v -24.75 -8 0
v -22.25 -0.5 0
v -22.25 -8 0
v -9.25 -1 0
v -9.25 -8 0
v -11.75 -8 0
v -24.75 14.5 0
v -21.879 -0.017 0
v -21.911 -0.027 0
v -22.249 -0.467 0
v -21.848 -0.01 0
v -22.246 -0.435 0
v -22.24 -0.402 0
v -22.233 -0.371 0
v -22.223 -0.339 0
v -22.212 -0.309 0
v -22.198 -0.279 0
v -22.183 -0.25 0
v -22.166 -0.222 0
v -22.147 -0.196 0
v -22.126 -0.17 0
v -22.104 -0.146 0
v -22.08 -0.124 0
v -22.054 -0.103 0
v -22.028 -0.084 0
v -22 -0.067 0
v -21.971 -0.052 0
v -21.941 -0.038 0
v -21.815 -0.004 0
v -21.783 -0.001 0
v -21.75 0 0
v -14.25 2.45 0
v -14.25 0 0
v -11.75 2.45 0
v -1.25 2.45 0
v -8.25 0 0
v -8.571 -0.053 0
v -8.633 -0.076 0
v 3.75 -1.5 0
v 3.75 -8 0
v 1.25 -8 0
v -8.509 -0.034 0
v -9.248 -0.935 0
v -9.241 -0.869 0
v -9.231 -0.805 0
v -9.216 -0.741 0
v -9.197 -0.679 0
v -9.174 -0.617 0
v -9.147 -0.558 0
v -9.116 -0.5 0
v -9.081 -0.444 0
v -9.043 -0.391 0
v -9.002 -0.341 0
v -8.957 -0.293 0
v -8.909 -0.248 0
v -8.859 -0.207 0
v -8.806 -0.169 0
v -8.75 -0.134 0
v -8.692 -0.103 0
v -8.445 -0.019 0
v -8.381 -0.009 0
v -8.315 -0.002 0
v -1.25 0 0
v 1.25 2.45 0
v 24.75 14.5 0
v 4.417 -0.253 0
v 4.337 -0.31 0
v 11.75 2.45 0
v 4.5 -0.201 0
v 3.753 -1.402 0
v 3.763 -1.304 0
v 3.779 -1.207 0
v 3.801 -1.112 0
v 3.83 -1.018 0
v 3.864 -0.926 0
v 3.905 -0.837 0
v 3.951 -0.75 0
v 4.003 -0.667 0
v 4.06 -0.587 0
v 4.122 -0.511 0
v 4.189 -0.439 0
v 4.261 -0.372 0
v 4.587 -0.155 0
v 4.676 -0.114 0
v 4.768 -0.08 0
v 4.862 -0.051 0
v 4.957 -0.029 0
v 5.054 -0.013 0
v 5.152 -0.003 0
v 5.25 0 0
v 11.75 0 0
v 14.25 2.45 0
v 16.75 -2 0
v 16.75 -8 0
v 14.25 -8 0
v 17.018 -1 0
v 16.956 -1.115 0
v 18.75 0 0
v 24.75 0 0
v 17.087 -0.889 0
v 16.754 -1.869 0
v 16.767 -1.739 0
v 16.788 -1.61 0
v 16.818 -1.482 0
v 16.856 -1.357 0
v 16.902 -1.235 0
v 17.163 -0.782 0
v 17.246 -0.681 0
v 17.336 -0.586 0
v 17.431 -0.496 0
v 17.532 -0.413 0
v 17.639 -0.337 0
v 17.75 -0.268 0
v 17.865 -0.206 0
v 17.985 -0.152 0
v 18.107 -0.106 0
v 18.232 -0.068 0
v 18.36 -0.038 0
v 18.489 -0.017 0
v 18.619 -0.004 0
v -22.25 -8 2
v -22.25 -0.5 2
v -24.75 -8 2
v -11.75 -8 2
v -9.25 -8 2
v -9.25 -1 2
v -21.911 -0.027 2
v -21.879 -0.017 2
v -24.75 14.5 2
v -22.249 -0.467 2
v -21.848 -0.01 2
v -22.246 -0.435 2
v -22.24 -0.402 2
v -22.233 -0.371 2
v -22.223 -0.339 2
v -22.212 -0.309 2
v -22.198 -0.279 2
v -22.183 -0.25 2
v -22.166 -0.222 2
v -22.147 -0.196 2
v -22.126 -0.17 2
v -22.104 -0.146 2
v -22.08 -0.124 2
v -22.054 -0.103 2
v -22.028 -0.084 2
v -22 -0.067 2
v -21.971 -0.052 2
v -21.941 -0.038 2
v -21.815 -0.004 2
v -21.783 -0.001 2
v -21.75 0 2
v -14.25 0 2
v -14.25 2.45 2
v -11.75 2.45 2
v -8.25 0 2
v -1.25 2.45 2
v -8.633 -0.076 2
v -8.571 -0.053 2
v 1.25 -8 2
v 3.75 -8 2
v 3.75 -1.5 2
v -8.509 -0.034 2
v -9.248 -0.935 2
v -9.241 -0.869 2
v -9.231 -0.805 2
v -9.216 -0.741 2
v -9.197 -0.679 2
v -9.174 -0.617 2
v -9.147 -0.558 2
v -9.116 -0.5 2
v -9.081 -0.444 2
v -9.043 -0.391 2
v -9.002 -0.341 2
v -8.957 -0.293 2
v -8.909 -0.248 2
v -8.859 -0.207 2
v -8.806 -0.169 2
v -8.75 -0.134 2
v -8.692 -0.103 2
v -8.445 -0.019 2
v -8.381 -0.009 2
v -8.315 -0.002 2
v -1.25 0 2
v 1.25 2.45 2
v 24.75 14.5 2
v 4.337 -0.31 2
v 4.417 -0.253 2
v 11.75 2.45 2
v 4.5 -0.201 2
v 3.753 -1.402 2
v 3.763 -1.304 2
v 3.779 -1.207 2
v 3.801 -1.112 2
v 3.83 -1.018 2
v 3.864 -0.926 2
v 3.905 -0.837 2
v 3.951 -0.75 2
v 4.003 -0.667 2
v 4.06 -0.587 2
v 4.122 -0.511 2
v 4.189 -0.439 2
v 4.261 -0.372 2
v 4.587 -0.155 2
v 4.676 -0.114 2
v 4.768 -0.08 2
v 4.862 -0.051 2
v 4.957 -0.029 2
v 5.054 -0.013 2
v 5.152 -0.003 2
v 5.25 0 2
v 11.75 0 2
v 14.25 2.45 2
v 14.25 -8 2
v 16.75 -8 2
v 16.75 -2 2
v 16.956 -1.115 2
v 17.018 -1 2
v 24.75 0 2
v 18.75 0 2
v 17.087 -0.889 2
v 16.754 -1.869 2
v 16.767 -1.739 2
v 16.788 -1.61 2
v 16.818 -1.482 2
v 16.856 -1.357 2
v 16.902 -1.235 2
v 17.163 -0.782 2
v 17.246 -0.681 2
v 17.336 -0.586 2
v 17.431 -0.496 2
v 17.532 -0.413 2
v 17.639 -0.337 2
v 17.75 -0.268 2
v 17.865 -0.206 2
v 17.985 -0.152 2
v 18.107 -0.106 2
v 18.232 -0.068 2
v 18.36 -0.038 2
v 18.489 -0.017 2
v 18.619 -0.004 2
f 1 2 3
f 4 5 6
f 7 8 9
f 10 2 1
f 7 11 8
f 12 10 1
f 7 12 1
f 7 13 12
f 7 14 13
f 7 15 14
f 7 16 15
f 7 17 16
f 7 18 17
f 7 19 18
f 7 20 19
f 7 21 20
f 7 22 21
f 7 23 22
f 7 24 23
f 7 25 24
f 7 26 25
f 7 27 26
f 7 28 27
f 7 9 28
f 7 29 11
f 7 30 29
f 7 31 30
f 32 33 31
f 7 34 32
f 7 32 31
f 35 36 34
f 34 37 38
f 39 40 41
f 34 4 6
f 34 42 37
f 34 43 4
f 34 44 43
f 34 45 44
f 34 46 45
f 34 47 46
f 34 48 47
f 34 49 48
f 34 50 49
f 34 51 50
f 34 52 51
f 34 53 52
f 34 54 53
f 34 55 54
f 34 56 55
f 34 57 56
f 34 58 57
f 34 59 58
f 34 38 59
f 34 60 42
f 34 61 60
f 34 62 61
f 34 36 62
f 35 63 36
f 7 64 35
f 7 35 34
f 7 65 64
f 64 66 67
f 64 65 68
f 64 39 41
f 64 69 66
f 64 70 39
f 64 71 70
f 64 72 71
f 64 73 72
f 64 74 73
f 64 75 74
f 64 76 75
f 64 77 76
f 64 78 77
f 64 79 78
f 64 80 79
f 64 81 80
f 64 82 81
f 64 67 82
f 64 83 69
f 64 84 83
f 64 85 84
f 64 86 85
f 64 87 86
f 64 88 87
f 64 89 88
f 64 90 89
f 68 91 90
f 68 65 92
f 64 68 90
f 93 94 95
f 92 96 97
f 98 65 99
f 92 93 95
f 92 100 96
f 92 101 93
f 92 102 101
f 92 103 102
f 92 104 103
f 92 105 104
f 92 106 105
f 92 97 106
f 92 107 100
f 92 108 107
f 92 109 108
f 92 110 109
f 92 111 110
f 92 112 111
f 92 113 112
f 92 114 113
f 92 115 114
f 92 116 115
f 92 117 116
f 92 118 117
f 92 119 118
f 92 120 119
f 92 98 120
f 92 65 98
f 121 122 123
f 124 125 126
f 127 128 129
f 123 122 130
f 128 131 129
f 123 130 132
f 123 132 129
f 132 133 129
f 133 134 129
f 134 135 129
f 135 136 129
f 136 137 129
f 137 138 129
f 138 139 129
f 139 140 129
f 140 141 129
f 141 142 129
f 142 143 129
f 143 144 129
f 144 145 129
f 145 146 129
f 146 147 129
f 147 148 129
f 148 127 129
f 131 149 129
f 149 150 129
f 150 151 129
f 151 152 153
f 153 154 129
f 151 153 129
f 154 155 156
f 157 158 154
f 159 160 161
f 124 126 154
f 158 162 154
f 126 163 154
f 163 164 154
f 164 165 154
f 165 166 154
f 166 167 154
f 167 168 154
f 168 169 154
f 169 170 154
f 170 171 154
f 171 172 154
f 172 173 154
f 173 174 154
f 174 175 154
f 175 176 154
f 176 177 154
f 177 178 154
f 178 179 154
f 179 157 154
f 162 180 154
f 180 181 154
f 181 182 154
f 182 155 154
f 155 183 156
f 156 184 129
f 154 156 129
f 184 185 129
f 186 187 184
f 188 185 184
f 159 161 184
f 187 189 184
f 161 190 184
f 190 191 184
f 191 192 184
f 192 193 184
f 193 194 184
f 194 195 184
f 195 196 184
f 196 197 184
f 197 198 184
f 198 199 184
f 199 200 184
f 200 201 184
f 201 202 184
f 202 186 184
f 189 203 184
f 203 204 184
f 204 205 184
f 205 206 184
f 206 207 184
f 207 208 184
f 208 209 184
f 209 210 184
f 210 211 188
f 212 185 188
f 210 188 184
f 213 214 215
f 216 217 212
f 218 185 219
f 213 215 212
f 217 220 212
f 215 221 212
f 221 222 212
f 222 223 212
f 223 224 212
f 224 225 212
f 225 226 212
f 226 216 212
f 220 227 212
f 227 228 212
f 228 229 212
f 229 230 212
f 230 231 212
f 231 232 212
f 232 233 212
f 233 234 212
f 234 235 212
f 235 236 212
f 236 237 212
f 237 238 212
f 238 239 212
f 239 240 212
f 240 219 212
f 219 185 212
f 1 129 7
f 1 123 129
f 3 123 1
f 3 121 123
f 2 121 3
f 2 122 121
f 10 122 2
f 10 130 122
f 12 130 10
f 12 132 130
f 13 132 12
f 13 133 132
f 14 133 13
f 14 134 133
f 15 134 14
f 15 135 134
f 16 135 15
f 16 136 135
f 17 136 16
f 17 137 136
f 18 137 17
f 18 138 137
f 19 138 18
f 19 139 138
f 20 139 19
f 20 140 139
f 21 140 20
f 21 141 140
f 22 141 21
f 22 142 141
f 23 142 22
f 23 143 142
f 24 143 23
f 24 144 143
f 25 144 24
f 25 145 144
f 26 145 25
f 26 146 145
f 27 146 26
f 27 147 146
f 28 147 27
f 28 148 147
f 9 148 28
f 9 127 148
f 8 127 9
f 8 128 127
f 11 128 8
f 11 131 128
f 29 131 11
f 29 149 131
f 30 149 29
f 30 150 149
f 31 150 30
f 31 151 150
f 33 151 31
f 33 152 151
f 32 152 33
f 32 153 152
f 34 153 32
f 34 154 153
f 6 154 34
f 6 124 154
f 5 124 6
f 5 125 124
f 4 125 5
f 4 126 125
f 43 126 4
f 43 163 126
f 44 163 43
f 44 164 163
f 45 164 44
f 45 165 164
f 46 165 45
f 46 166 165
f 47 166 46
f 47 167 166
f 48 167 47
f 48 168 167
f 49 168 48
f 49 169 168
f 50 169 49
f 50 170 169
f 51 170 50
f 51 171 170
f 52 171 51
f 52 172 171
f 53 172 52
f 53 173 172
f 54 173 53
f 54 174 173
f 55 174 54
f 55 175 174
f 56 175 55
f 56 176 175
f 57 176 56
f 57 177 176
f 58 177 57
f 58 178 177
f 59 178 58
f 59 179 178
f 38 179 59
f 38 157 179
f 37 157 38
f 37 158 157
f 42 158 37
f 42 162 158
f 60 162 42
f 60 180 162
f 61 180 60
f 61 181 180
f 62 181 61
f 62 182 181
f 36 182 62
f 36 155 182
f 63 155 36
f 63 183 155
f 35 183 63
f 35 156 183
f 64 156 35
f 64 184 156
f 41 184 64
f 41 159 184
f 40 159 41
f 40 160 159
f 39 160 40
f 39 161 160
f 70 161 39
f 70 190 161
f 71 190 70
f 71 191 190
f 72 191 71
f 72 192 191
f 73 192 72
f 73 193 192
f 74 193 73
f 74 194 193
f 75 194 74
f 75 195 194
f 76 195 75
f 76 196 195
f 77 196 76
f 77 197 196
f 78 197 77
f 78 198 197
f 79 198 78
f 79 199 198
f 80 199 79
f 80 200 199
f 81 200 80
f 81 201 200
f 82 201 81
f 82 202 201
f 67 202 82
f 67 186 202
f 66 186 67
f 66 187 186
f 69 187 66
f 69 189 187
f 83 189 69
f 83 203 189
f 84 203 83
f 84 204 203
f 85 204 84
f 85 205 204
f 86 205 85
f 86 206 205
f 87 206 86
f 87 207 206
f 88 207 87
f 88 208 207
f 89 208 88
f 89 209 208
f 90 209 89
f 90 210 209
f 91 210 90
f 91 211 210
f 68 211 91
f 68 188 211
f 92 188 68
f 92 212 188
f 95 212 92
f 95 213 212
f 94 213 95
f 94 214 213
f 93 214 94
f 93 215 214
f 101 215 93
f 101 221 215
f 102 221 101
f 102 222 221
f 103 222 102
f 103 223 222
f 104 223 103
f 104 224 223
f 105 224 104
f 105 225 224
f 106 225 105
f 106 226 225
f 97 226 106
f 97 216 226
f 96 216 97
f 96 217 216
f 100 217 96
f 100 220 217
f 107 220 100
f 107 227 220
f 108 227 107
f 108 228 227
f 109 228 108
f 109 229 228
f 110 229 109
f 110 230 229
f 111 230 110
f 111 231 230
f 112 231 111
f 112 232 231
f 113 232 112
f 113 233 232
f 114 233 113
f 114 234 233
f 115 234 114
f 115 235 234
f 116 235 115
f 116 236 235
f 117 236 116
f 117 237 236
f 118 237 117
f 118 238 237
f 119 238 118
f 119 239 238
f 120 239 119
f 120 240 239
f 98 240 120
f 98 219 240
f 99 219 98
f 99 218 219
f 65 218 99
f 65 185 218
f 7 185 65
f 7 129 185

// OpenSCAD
// file: ../hub75_p5_64x32_outer_corner_radius_comparator.scad
// R2: coarse external-corner radius comparator for the HUB75 rear perimeter.
//
// The production model currently uses R0 at the rear outer X/Z corner. This
// helper does not assume that is physically correct: it provides four small
// concave external-radius references so a real moulded radius can be bracketed
// before changing CAD.

function hub75_vrf_outer_corner_radius_comparator_version() = "v0.3";
function hub75_vrf_outer_corner_radius_comparator_radii() = [0.5, 1.0, 1.5, 2.0];
function hub75_vrf_outer_corner_radius_comparator_probe_leg() = 8.0;
function hub75_vrf_outer_corner_radius_comparator_probe_wall() = 2.5;
function hub75_vrf_outer_corner_radius_comparator_spacing() = 13.0;
function hub75_vrf_outer_corner_radius_comparator_handle_height() = 12.0;

function hub75_vrf_outer_corner_radius_comparator_total_width() =
    let(
        radii = hub75_vrf_outer_corner_radius_comparator_radii(),
        leg = hub75_vrf_outer_corner_radius_comparator_probe_leg(),
        wall = hub75_vrf_outer_corner_radius_comparator_probe_wall(),
        spacing = hub75_vrf_outer_corner_radius_comparator_spacing()
    )
    (len(radii)-1)*spacing + leg + wall;

function hub75_vrf_outer_corner_radius_probe_tangent(index) =
    let(
        total_w = hub75_vrf_outer_corner_radius_comparator_total_width(),
        wall = hub75_vrf_outer_corner_radius_comparator_probe_wall(),
        spacing = hub75_vrf_outer_corner_radius_comparator_spacing()
    )
    [-total_w/2 + wall + index*spacing, 0];

// Canonical external-radius probe around a convex 90-degree corner.
// The theoretical sharp tangent intersection is [0,0]. In this orientation the
// physical part being checked occupies +X/-Y, so a rounded corner of radius r
// has its arc centre at [+r,-r]. The gauge material sits outside that corner on
// the top/left side. This orientation keeps the raised labels readable when the
// helper is used on the rear upper-left panel corner.
function _hub75_vrf_outer_radius_probe_points(radius, leg, wall, steps=24) =
    concat(
        [[leg, 0], [radius, 0]],
        [
            for(i=[1:steps-1])
                let(a = 90 - i*90/steps)
                [
                    radius - radius*cos(a),
                    -radius + radius*sin(a)
                ]
        ],
        [
            [0, -radius],
            [0, -leg],
            [-wall, -leg],
            [-wall, wall],
            [leg, wall]
        ]
    );

module _hub75_vrf_outer_radius_probe_2d(
    radius,
    leg = hub75_vrf_outer_corner_radius_comparator_probe_leg(),
    wall = hub75_vrf_outer_corner_radius_comparator_probe_wall()
) {
    polygon(points=_hub75_vrf_outer_radius_probe_points(radius, leg, wall));
}

module hub75_vrf_outer_corner_radius_comparator_base(
    thickness = 2.0,
    leg = hub75_vrf_outer_corner_radius_comparator_probe_leg(),
    wall = hub75_vrf_outer_corner_radius_comparator_probe_wall(),
    spacing = hub75_vrf_outer_corner_radius_comparator_spacing(),
    handle_height = hub75_vrf_outer_corner_radius_comparator_handle_height()
) {
    radii = hub75_vrf_outer_corner_radius_comparator_radii();
    total_w = (len(radii)-1)*spacing + leg + wall;

    linear_extrude(height=thickness)
        union() {
            // Slight overlap avoids relying on a merely coplanar contact between
            // the individual probe arms and the common handle.
            translate([-total_w/2, wall-0.05])
                square([total_w, handle_height+0.05]);

            for(i=[0:len(radii)-1]) {
                tangent = hub75_vrf_outer_corner_radius_probe_tangent(i);
                translate(tangent)
                    _hub75_vrf_outer_radius_probe_2d(
                        radii[i],
                        leg,
                        wall
                    );
            }
        }
}

module hub75_vrf_outer_corner_radius_comparator_markings(
    thickness = 2.0,
    leg = hub75_vrf_outer_corner_radius_comparator_probe_leg(),
    wall = hub75_vrf_outer_corner_radius_comparator_probe_wall(),
    spacing = hub75_vrf_outer_corner_radius_comparator_spacing(),
    handle_height = hub75_vrf_outer_corner_radius_comparator_handle_height(),
    version = hub75_vrf_outer_corner_radius_comparator_version(),
    marking_height = 0.50
) {
    radii = hub75_vrf_outer_corner_radius_comparator_radii();
    labels = ["R0.5", "R1.0", "R1.5", "R2.0"];
    z0 = thickness - 0.02;
    h = marking_height + 0.02;

    for(i=[0:len(radii)-1]) {
        tangent = hub75_vrf_outer_corner_radius_probe_tangent(i);
        translate([tangent[0] + (leg-wall)/2, wall+3.1, z0])
            linear_extrude(height=h)
                text(
                    labels[i],
                    size=2.3,
                    halign="center",
                    valign="center"
                );
    }

    translate([0, wall+9.0, z0])
        linear_extrude(height=h)
            text(
                str("R2 ", version),
                size=2.8,
                halign="center",
                valign="center"
            );
}

module hub75_vrf_outer_corner_radius_comparator() {
    union() {
        hub75_vrf_outer_corner_radius_comparator_base();
        hub75_vrf_outer_corner_radius_comparator_markings();
    }
}
// main file
use <../hub75_p5_64x32_outer_corner_radius_comparator.scad>

$fn = 96;
hub75_vrf_outer_corner_radius_comparator_base();
